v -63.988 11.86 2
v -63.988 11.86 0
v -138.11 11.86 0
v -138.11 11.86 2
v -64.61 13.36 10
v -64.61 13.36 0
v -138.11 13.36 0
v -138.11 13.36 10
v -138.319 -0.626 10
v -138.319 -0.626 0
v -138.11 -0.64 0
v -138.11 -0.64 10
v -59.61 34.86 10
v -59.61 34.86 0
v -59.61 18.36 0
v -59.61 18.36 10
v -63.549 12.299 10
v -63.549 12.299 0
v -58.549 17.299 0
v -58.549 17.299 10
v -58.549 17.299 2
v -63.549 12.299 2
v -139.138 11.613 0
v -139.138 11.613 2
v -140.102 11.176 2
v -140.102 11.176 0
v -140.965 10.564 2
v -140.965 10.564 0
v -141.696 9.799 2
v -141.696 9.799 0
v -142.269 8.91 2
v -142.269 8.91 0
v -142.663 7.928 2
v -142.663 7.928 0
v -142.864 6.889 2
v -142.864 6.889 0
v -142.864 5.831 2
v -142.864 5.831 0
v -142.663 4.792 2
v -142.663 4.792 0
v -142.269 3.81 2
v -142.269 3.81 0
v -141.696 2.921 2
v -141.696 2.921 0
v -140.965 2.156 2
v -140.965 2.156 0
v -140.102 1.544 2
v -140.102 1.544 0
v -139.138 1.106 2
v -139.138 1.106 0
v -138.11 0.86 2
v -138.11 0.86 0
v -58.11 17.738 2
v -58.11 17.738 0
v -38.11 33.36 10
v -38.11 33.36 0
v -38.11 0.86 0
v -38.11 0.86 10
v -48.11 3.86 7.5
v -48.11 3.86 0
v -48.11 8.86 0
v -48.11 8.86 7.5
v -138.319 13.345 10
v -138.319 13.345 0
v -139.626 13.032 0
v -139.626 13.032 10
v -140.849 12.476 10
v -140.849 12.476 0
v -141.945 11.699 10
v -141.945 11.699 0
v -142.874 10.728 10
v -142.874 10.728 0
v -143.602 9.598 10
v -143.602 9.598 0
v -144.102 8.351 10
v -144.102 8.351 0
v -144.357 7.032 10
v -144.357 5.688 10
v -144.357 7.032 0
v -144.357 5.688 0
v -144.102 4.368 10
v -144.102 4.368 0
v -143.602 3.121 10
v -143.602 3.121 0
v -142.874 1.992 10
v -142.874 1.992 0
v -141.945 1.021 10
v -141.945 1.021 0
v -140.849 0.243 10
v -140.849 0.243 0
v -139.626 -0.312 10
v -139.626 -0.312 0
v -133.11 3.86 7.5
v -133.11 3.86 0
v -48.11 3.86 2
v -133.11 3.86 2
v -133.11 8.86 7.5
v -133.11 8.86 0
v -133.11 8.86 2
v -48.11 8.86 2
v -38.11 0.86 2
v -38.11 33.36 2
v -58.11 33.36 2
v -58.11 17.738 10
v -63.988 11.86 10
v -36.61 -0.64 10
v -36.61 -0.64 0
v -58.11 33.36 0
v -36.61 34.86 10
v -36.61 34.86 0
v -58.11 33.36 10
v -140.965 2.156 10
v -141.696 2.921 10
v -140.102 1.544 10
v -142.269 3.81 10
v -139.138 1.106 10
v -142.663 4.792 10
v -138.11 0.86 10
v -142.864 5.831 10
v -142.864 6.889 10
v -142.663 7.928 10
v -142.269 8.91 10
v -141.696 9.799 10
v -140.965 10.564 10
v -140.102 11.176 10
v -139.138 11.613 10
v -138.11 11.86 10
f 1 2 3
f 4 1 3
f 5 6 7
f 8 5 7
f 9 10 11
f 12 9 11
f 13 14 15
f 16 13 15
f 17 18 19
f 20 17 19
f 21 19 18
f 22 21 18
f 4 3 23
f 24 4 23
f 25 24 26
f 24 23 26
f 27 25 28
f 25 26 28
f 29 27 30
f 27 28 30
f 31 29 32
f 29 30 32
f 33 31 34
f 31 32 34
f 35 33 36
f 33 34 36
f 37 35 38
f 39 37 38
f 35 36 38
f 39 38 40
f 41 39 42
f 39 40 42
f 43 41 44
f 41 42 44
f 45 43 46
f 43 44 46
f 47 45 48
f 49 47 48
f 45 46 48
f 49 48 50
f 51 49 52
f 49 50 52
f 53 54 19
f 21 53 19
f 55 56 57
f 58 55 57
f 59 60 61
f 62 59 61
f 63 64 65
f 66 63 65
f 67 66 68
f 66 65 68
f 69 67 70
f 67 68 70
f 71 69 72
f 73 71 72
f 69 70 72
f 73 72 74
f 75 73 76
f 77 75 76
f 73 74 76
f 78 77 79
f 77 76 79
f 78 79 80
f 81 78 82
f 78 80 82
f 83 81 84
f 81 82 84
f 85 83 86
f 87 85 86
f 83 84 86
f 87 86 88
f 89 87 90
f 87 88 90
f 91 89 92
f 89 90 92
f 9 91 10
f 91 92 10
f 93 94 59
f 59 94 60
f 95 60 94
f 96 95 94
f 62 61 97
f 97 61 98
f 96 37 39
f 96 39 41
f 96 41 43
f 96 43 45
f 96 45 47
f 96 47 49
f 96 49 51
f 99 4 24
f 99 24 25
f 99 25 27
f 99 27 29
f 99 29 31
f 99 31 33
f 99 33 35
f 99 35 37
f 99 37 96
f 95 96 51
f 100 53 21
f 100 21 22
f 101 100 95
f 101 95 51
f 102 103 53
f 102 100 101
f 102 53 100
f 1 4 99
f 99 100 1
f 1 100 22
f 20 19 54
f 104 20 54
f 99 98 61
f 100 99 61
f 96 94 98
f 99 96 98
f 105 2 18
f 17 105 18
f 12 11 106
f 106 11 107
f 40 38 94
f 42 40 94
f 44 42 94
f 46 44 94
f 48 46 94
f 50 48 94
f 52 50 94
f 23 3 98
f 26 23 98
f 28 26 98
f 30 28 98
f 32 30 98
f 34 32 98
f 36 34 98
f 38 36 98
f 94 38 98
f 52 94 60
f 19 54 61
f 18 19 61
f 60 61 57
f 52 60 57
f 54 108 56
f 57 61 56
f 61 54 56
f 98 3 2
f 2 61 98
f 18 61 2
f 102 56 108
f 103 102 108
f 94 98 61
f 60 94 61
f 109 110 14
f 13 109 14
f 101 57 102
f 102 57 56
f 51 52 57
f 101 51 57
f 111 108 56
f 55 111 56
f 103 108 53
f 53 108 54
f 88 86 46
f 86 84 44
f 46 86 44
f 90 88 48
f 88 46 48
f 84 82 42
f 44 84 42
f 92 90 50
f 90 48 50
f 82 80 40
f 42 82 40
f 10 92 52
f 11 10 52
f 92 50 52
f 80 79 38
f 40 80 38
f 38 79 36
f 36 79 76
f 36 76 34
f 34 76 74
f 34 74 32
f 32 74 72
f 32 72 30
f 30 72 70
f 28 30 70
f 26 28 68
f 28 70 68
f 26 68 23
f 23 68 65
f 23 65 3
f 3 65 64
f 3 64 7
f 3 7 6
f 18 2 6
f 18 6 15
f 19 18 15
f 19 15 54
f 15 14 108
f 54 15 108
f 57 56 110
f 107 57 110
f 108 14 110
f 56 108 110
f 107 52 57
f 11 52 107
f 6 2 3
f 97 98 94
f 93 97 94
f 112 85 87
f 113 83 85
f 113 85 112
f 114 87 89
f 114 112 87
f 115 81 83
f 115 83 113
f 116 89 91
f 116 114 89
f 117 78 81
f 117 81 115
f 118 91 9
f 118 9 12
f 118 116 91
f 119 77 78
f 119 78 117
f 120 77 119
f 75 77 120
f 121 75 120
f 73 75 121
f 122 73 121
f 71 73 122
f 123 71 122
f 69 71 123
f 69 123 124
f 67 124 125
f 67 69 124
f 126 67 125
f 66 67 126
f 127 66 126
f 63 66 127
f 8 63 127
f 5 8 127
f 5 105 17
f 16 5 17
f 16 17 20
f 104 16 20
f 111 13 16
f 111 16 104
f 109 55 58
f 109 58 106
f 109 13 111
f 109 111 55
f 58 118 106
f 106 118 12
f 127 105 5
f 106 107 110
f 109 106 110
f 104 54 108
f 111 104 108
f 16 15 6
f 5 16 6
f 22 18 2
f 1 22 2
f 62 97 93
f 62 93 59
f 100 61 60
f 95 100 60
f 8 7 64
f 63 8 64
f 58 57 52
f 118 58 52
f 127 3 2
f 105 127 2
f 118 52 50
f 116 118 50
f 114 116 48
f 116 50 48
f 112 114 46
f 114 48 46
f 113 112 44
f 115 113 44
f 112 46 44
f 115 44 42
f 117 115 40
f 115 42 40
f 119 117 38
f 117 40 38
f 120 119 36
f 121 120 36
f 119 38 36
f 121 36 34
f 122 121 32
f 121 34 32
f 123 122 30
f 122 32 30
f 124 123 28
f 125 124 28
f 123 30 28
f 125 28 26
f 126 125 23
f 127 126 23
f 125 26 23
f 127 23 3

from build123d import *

# Parameters (mm, degrees)
F1_DEPTH = 10
F2_DEPTH = 7.5
F3_DEPTH = 2


with BuildPart() as f1:
    # F0 (on Top) → F1 (new body)
    with BuildSketch(Plane.XY):
        with BuildLine():
            Line((-138.109595, 13.359751), (-138.318843, 13.345084))
            ThreePointArc((-138.318843, 13.345084), (-144.389084, 6.359751), (-138.318843, -0.625583))
            Line((-138.318843, -0.625583), (-138.109595, -0.640249))
            Line((-138.109595, -0.640249), (-36.609595, -0.640249))
            Line((-36.609595, -0.640249), (-36.609595, 18.359751))
            Line((-36.609595, 18.359751), (-36.609595, 23.981071))
            Line((-36.609595, 23.981071), (-36.609595, 33.359751))
            Line((-36.609595, 33.359751), (-36.609595, 34.859751))
            Line((-36.609595, 34.859751), (-38.109595, 34.859751))
            Line((-38.109595, 34.859751), (-58.109595, 34.859751))
            Line((-58.109595, 34.859751), (-59.609595, 34.859751))
            Line((-59.609595, 34.859751), (-59.609595, 33.359751))
            Line((-59.609595, 33.359751), (-59.609595, 23.981071))
            Line((-59.609595, 23.981071), (-59.609595, 18.359751))
            Line((-59.609595, 18.359751), (-64.609595, 13.359751))
            Line((-64.609595, 13.359751), (-64.920255, 13.359751))
            Line((-64.920255, 13.359751), (-70.230915, 13.359751))
            Line((-70.230915, 13.359751), (-138.109595, 13.359751))
        make_face()
        with BuildLine():
            Line((-38.109595, 0.859751), (-133.109595, 0.859751))
            Line((-133.109595, 0.859751), (-138.109595, 0.859751))
            ThreePointArc((-138.109595, 0.859751), (-142.889084, 6.359751), (-138.109595, 11.859751))
            Line((-138.109595, 11.859751), (-133.109595, 11.859751))
            Line((-133.109595, 11.859751), (-69.609595, 11.859751))
            Line((-69.609595, 11.859751), (-63.988274, 11.859751))
            Line((-63.988274, 11.859751), (-63.548934, 12.29909))
            Line((-63.548934, 12.29909), (-58.548934, 17.29909))
            Line((-58.548934, 17.29909), (-58.109595, 17.73843))
            Line((-58.109595, 17.73843), (-58.109595, 23.359751))
            Line((-58.109595, 23.359751), (-58.109595, 33.359751))
            Line((-58.109595, 33.359751), (-48.109595, 33.359751))
            Line((-48.109595, 33.359751), (-38.109595, 33.359751))
            Line((-38.109595, 33.359751), (-38.109595, 0.859751))
        make_face(mode=Mode.SUBTRACT)
    extrude(amount=F1_DEPTH)


with BuildPart() as f2:
    # F0 (on Top) → F2 (new body)
    with BuildSketch(Plane.XY):
        Polygon((-133.109595, 8.859751), (-133.109595, 6.359751), (-133.109595, 3.859751), (-48.109595, 3.859751), (-48.109595, 8.859751), align=None)
    extrude(amount=F2_DEPTH)


with BuildPart() as f3:
    # F0 (on Top) → F3 (new body)
    with BuildSketch(Plane.XY):
        with BuildLine():
            Line((-138.109595, 0.859751), (-133.109595, 0.859751))
            Line((-133.109595, 0.859751), (-38.109595, 0.859751))
            Line((-38.109595, 0.859751), (-38.109595, 33.359751))
            Line((-38.109595, 33.359751), (-48.109595, 33.359751))
            Line((-48.109595, 33.359751), (-58.109595, 33.359751))
            Line((-58.109595, 33.359751), (-58.109595, 23.359751))
            Line((-58.109595, 23.359751), (-58.109595, 17.73843))
            Line((-58.109595, 17.73843), (-58.548934, 17.29909))
            Line((-58.548934, 17.29909), (-63.548934, 12.29909))
            Line((-63.548934, 12.29909), (-63.988274, 11.859751))
            Line((-63.988274, 11.859751), (-69.609595, 11.859751))
            Line((-69.609595, 11.859751), (-133.109595, 11.859751))
            Line((-133.109595, 11.859751), (-138.109595, 11.859751))
            ThreePointArc((-138.109595, 11.859751), (-142.889084, 6.359751), (-138.109595, 0.859751))
        make_face()
        Polygon((-133.109595, 3.859751), (-133.109595, 6.359751), (-133.109595, 8.859751), (-48.109595, 8.859751), (-48.109595, 3.859751), align=None, mode=Mode.SUBTRACT)
    extrude(amount=F3_DEPTH)


solid = Compound([f1.part, f2.part, f3.part])
